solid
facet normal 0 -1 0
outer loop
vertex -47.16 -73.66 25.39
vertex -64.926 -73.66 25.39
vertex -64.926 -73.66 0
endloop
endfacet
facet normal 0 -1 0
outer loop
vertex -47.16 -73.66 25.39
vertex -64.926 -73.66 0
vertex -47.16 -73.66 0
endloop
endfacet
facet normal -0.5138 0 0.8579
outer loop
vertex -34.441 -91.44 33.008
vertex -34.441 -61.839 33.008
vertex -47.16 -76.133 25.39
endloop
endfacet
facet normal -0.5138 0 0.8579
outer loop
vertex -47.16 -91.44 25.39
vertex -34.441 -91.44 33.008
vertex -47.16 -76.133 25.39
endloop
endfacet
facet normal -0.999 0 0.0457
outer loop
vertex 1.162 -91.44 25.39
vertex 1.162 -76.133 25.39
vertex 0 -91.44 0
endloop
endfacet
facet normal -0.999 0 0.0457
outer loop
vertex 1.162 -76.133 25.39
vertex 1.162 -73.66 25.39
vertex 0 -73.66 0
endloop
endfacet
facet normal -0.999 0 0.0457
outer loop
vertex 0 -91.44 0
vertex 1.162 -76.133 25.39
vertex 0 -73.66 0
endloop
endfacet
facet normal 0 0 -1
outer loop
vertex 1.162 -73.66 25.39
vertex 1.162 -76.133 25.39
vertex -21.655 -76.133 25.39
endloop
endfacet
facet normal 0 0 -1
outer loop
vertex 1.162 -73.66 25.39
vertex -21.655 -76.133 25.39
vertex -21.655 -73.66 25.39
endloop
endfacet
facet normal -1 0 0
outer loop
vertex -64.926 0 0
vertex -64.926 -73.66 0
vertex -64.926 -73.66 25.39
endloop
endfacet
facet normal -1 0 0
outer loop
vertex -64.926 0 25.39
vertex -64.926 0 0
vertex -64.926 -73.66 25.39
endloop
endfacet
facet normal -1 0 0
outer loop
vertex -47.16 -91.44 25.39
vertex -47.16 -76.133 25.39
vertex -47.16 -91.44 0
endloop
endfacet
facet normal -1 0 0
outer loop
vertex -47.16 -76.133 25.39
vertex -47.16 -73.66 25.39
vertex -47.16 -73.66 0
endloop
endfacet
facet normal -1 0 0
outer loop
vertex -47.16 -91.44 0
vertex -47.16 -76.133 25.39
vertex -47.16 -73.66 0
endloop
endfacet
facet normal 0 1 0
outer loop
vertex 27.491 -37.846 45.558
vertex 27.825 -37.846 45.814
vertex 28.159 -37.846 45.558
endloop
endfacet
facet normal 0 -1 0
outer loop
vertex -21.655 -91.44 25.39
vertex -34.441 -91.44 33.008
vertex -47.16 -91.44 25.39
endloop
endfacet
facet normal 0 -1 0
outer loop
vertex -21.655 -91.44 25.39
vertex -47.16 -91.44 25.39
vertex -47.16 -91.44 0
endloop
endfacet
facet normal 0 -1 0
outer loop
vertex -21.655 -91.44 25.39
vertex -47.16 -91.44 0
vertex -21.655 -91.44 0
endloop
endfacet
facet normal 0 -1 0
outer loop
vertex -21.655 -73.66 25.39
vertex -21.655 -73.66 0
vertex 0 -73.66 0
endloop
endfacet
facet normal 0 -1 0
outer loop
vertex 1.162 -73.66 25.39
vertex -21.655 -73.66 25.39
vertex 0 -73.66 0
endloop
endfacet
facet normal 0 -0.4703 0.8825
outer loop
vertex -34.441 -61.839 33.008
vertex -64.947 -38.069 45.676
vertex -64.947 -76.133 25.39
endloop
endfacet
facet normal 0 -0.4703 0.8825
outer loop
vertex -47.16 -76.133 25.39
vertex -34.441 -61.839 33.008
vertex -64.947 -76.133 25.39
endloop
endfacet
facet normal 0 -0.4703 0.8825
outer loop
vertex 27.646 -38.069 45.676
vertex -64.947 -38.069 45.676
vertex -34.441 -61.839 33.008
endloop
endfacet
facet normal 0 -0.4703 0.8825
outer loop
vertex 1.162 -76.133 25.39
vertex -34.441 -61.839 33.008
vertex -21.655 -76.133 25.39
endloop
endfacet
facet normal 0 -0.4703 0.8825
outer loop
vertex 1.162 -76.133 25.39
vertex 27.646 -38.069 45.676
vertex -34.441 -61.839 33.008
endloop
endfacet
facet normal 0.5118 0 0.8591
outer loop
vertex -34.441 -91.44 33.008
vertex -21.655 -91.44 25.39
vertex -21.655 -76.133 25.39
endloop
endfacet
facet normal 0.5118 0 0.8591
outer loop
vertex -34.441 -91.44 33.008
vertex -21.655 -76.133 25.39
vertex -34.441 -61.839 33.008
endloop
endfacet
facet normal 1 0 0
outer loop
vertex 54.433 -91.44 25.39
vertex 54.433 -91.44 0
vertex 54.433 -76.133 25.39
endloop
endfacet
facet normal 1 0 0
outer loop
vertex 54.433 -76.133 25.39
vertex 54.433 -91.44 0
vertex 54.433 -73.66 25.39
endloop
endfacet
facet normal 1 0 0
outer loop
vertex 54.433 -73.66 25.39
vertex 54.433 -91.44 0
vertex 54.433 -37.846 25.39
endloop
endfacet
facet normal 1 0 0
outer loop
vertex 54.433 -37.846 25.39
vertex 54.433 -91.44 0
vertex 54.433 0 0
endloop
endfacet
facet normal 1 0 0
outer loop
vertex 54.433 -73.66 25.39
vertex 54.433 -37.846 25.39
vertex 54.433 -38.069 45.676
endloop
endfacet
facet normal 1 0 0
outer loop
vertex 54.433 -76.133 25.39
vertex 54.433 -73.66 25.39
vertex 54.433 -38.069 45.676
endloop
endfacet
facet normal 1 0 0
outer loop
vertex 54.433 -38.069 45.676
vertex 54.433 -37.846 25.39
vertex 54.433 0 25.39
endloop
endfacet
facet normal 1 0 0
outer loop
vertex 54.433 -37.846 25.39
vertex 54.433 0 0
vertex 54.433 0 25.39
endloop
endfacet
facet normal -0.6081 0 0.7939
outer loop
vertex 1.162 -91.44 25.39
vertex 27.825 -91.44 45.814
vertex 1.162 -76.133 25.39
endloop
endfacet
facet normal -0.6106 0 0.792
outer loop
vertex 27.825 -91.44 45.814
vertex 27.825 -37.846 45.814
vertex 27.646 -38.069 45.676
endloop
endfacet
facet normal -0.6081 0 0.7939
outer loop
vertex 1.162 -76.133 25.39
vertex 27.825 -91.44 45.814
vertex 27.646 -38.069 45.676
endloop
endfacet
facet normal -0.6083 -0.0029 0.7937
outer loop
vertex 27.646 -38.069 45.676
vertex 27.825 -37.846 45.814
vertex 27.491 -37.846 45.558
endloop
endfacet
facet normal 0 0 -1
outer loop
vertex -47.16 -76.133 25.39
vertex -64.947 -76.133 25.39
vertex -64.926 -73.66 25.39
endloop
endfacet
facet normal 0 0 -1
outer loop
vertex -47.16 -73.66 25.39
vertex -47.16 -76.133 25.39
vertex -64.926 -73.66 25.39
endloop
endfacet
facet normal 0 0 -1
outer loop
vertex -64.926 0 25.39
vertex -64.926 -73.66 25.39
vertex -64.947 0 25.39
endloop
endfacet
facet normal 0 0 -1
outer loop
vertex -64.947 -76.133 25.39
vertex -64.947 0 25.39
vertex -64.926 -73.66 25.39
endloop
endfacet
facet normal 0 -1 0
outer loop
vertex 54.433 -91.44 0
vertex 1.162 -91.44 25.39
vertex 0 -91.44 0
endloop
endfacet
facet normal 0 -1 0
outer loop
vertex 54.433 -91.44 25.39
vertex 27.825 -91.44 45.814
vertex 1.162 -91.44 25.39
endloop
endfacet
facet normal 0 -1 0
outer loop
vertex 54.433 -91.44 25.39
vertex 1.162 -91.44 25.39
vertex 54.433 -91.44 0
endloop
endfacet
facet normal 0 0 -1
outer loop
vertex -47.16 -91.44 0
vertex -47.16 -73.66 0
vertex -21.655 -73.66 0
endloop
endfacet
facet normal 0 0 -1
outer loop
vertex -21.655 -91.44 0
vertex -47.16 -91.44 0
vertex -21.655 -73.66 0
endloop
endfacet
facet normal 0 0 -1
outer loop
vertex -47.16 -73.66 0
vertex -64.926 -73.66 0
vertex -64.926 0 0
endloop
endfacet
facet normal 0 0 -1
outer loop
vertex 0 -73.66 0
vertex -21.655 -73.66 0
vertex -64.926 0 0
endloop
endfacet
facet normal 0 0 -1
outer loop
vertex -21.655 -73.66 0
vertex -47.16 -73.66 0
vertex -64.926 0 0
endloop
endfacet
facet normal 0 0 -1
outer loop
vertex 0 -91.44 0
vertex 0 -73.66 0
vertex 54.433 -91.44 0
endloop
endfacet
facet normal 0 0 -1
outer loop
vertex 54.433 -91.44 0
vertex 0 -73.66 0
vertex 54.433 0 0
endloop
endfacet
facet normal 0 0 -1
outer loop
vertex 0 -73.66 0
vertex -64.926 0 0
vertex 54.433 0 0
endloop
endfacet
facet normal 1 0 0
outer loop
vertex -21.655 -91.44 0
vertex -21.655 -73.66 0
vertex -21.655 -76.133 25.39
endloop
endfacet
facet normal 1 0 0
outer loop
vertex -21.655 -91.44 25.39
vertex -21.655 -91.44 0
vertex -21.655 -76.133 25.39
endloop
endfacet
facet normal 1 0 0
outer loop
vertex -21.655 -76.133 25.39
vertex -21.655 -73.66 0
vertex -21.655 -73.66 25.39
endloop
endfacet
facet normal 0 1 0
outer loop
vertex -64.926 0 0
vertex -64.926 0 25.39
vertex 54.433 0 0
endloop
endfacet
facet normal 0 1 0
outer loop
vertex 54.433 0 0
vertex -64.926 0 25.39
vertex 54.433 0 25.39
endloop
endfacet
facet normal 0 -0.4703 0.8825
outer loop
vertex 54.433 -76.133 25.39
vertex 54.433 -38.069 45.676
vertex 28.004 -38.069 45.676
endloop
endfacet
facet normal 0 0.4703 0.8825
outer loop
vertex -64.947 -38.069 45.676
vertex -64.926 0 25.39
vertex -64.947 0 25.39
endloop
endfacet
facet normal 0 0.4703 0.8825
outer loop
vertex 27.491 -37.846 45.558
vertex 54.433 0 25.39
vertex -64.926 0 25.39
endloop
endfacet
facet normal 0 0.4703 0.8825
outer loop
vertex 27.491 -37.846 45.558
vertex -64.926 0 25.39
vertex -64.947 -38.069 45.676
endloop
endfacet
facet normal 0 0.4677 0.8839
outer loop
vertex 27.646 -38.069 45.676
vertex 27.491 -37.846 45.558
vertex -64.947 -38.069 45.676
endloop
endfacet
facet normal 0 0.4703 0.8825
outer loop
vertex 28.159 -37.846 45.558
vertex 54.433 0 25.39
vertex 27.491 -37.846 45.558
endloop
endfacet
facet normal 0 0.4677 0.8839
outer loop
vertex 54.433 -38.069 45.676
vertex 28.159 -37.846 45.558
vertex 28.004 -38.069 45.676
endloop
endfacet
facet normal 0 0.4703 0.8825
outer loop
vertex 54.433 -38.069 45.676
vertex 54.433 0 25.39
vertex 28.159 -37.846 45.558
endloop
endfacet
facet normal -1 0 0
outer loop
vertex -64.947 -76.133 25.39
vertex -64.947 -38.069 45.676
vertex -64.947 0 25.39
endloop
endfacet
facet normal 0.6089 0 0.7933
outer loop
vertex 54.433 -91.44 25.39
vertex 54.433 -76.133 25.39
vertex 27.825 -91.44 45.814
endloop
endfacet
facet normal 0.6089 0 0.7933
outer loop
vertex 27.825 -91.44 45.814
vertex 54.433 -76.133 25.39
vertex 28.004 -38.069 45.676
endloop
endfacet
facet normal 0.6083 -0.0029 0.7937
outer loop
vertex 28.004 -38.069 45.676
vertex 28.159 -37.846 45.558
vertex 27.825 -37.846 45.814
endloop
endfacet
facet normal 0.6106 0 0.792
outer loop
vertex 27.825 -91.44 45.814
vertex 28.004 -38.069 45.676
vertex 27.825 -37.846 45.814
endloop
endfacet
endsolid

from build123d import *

# Parameters (mm, degrees)
F0_W     = 119.3591766059
F0_H     = 25.3895912319
F1_DEPTH = 73.66
F3_DEPTH = 119.38
F5_DEPTH = 35.814
F6_DEPTH = 17.78


with BuildPart() as f1:
    # F0 (on Front) → F1 (new body)
    with BuildSketch(Plane.XZ):
        with Locations((-5.246559158, 12.694795616)):
            Rectangle(F0_W, F0_H)
    extrude(amount=F1_DEPTH)

    # F2 (on face) → F3 (join)
    with BuildSketch(Plane.YZ.offset(54.433029145)):
        Polygon((-38.0689874291, 25.3895912319), (0, 25.3895912319), (-38.0689874291, 45.67636922), align=None)
        Polygon((-76.133325696, 25.3895912319), (-38.0689874291, 25.3895912319), (-38.0689874291, 45.67636922), align=None)
    extrude(amount=-F3_DEPTH)

    # F4 (on face) → F5 (join)
    with BuildSketch(Plane.XZ.offset(73.66)):
        Polygon((-34.4408005476, 25.3895912319), (-21.6549783945, 25.3895912319), (-34.4408005476, 33.0080874264), align=None)
        Polygon((27.8254915029, 25.3895912319), (54.433029145, 25.3895912319), (27.8254915029, 45.8136871457), align=None)
        Polygon((1.1622435413, 25.3895912319), (27.8254915029, 25.3895912319), (27.8254915029, 45.8136871457), align=None)
        Polygon((-47.1603758633, 25.3895912319), (-34.4408005476, 25.3895912319), (-34.4408005476, 33.0080874264), align=None)
    extrude(amount=-F5_DEPTH)

    # F4 (on face) → F6 (join)
    with BuildSketch(Plane.XZ.offset(73.66)):
        Polygon((54.433029145, 0), (54.433029145, 25.3895912319), (27.8254915029, 25.3895912319), (1.1622435413, 25.3895912319), (0, 0), align=None)
        Polygon((27.8254915029, 25.3895912319), (54.433029145, 25.3895912319), (27.8254915029, 45.8136871457), align=None)
        Polygon((1.1622435413, 25.3895912319), (27.8254915029, 25.3895912319), (27.8254915029, 45.8136871457), align=None)
        Polygon((-34.4408005476, 33.0080874264), (-47.1603758633, 25.3895912319), (-34.4408005476, 25.3895912319), align=None)
        Polygon((-34.4408005476, 25.3895912319), (-47.1603758633, 25.3895912319), (-47.1603758633, 0), (-21.6549783945, 0), (-21.6549783945, 25.3895912319), align=None)
        Polygon((-34.4408005476, 33.0080874264), (-34.4408005476, 25.3895912319), (-21.6549783945, 25.3895912319), align=None)
    extrude(amount=F6_DEPTH)


solid = f1.part
